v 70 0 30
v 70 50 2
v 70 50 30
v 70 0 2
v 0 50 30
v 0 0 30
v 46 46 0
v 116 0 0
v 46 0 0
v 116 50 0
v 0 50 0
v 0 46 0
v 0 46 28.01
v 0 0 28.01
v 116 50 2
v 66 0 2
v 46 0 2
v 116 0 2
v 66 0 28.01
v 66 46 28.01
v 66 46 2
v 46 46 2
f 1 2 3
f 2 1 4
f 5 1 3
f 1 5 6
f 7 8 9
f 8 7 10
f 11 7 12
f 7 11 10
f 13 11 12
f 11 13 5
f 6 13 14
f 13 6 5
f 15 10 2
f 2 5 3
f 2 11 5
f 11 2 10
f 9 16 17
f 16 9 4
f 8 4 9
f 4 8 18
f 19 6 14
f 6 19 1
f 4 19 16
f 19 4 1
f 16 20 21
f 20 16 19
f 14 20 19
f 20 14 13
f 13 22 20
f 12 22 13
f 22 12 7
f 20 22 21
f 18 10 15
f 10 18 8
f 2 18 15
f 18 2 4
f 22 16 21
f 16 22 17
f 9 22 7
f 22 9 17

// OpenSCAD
// Dimensions for the enclosure parts
$fn = 64;

// Part 1: Box (main enclosure)
box_width = 70;
box_depth = 50;
box_height = 30;
wall_thickness = 2;
floor_thickness = 2;

// Part 2: Lid (printed upside down)
lid_plate_thickness = 2;
lip_thickness = 1.5;
lip_height = 4;
lip_outer_width = 65.6;
lip_outer_depth = 45.6;

// Spacing between parts
gap = 10;

// Center of box on X and Y
box_x_center = 0;
box_y_center = 0;

// Center of lid on X and Y (placed on +X side of box)
lid_x_center = box_width / 2 + gap + lid_plate_thickness / 2;
lid_y_center = 0;

// --- Box (Part 1) ---
// Ensure the box is centered on the origin and sits on the bed (z = 0)
// The box should have its bottom at z = 0 and extend to z = 30

// Outer box (solid)
box_outer = [box_width, box_depth, box_height];

// Inner cavity (to be removed from outer box)
box_inner = [
  box_width - 2 * wall_thickness,
  box_depth - 2 * wall_thickness,
  box_height - floor_thickness
];

// Create box with walls and floor, centered in X and Y, but bottom at z = 0
// We'll use a cube from z = 0 to z = 30, and subtract the inner cavity from z = 0 to z = 30 - floor_thickness
translate([0, 0, 0]) {
  difference() {
    // Outer box (from z=0 to z=30)
    cube(box_outer, center = false);
    // Subtract inner cavity (from z=0 to z=30 - floor_thickness), centered in X and Y
    translate([0, 0, 0]) {
      cube([box_inner[0], box_inner[1], box_inner[2] + 0.01], center = false);
    }
  }
}

// --- Lid (Part 2) ---
// Lid plate (flat base) - placed on the bed (z = 0), so it lies at z = 0 to z = lid_plate_thickness
translate([lid_x_center, lid_y_center, 0]) {
  // Plate lies on the bed (z = 0), so we place it at z = 0
  cube([box_width, box_depth, lid_plate_thickness], center = false);
}

// Lip (1.5 mm thick, 4 mm tall, centered on the plate)
// The lip is a rectangular wall 1.5 mm thick, 4 mm high, sitting on top of the plate
// Outer lip size: 65.6 x 45.6 mm, centered on the plate

// We'll create the lip as a 3D extrusion of a rectangular frame (2D shape) at the top of the plate
// The lip is built on top of the plate (z = lid_plate_thickness to z = lid_plate_thickness + lip_height)

// Define the lip's outer and inner rectangles (in 2D)
// The lip is a frame: outer rectangle minus inner rectangle
lip_outer = [lip_outer_width, lip_outer_depth];
lip_inner = [
  lip_outer_width - 2 * lip_thickness,
  lip_outer_depth - 2 * lip_thickness
];

// Create lip as a 3D extrusion of a 2D frame (using difference of two squares)
translate([lid_x_center, lid_y_center, lid_plate_thickness]) {
  // Use a 2D shape (square) for the lip profile, then extrude it
  difference() {
    // Outer rectangle (top face of lip)
    square(lip_outer, center = true);
    // Inner rectangle (hole to remove)
    translate([0, 0]) {
      square(lip_inner, center = true);
    }
  }
  // Extrude the 2D shape upward to form the lip (4 mm height)
  linear_extrude(lip_height) {
    // The 2D shape is already defined above
  }
}
